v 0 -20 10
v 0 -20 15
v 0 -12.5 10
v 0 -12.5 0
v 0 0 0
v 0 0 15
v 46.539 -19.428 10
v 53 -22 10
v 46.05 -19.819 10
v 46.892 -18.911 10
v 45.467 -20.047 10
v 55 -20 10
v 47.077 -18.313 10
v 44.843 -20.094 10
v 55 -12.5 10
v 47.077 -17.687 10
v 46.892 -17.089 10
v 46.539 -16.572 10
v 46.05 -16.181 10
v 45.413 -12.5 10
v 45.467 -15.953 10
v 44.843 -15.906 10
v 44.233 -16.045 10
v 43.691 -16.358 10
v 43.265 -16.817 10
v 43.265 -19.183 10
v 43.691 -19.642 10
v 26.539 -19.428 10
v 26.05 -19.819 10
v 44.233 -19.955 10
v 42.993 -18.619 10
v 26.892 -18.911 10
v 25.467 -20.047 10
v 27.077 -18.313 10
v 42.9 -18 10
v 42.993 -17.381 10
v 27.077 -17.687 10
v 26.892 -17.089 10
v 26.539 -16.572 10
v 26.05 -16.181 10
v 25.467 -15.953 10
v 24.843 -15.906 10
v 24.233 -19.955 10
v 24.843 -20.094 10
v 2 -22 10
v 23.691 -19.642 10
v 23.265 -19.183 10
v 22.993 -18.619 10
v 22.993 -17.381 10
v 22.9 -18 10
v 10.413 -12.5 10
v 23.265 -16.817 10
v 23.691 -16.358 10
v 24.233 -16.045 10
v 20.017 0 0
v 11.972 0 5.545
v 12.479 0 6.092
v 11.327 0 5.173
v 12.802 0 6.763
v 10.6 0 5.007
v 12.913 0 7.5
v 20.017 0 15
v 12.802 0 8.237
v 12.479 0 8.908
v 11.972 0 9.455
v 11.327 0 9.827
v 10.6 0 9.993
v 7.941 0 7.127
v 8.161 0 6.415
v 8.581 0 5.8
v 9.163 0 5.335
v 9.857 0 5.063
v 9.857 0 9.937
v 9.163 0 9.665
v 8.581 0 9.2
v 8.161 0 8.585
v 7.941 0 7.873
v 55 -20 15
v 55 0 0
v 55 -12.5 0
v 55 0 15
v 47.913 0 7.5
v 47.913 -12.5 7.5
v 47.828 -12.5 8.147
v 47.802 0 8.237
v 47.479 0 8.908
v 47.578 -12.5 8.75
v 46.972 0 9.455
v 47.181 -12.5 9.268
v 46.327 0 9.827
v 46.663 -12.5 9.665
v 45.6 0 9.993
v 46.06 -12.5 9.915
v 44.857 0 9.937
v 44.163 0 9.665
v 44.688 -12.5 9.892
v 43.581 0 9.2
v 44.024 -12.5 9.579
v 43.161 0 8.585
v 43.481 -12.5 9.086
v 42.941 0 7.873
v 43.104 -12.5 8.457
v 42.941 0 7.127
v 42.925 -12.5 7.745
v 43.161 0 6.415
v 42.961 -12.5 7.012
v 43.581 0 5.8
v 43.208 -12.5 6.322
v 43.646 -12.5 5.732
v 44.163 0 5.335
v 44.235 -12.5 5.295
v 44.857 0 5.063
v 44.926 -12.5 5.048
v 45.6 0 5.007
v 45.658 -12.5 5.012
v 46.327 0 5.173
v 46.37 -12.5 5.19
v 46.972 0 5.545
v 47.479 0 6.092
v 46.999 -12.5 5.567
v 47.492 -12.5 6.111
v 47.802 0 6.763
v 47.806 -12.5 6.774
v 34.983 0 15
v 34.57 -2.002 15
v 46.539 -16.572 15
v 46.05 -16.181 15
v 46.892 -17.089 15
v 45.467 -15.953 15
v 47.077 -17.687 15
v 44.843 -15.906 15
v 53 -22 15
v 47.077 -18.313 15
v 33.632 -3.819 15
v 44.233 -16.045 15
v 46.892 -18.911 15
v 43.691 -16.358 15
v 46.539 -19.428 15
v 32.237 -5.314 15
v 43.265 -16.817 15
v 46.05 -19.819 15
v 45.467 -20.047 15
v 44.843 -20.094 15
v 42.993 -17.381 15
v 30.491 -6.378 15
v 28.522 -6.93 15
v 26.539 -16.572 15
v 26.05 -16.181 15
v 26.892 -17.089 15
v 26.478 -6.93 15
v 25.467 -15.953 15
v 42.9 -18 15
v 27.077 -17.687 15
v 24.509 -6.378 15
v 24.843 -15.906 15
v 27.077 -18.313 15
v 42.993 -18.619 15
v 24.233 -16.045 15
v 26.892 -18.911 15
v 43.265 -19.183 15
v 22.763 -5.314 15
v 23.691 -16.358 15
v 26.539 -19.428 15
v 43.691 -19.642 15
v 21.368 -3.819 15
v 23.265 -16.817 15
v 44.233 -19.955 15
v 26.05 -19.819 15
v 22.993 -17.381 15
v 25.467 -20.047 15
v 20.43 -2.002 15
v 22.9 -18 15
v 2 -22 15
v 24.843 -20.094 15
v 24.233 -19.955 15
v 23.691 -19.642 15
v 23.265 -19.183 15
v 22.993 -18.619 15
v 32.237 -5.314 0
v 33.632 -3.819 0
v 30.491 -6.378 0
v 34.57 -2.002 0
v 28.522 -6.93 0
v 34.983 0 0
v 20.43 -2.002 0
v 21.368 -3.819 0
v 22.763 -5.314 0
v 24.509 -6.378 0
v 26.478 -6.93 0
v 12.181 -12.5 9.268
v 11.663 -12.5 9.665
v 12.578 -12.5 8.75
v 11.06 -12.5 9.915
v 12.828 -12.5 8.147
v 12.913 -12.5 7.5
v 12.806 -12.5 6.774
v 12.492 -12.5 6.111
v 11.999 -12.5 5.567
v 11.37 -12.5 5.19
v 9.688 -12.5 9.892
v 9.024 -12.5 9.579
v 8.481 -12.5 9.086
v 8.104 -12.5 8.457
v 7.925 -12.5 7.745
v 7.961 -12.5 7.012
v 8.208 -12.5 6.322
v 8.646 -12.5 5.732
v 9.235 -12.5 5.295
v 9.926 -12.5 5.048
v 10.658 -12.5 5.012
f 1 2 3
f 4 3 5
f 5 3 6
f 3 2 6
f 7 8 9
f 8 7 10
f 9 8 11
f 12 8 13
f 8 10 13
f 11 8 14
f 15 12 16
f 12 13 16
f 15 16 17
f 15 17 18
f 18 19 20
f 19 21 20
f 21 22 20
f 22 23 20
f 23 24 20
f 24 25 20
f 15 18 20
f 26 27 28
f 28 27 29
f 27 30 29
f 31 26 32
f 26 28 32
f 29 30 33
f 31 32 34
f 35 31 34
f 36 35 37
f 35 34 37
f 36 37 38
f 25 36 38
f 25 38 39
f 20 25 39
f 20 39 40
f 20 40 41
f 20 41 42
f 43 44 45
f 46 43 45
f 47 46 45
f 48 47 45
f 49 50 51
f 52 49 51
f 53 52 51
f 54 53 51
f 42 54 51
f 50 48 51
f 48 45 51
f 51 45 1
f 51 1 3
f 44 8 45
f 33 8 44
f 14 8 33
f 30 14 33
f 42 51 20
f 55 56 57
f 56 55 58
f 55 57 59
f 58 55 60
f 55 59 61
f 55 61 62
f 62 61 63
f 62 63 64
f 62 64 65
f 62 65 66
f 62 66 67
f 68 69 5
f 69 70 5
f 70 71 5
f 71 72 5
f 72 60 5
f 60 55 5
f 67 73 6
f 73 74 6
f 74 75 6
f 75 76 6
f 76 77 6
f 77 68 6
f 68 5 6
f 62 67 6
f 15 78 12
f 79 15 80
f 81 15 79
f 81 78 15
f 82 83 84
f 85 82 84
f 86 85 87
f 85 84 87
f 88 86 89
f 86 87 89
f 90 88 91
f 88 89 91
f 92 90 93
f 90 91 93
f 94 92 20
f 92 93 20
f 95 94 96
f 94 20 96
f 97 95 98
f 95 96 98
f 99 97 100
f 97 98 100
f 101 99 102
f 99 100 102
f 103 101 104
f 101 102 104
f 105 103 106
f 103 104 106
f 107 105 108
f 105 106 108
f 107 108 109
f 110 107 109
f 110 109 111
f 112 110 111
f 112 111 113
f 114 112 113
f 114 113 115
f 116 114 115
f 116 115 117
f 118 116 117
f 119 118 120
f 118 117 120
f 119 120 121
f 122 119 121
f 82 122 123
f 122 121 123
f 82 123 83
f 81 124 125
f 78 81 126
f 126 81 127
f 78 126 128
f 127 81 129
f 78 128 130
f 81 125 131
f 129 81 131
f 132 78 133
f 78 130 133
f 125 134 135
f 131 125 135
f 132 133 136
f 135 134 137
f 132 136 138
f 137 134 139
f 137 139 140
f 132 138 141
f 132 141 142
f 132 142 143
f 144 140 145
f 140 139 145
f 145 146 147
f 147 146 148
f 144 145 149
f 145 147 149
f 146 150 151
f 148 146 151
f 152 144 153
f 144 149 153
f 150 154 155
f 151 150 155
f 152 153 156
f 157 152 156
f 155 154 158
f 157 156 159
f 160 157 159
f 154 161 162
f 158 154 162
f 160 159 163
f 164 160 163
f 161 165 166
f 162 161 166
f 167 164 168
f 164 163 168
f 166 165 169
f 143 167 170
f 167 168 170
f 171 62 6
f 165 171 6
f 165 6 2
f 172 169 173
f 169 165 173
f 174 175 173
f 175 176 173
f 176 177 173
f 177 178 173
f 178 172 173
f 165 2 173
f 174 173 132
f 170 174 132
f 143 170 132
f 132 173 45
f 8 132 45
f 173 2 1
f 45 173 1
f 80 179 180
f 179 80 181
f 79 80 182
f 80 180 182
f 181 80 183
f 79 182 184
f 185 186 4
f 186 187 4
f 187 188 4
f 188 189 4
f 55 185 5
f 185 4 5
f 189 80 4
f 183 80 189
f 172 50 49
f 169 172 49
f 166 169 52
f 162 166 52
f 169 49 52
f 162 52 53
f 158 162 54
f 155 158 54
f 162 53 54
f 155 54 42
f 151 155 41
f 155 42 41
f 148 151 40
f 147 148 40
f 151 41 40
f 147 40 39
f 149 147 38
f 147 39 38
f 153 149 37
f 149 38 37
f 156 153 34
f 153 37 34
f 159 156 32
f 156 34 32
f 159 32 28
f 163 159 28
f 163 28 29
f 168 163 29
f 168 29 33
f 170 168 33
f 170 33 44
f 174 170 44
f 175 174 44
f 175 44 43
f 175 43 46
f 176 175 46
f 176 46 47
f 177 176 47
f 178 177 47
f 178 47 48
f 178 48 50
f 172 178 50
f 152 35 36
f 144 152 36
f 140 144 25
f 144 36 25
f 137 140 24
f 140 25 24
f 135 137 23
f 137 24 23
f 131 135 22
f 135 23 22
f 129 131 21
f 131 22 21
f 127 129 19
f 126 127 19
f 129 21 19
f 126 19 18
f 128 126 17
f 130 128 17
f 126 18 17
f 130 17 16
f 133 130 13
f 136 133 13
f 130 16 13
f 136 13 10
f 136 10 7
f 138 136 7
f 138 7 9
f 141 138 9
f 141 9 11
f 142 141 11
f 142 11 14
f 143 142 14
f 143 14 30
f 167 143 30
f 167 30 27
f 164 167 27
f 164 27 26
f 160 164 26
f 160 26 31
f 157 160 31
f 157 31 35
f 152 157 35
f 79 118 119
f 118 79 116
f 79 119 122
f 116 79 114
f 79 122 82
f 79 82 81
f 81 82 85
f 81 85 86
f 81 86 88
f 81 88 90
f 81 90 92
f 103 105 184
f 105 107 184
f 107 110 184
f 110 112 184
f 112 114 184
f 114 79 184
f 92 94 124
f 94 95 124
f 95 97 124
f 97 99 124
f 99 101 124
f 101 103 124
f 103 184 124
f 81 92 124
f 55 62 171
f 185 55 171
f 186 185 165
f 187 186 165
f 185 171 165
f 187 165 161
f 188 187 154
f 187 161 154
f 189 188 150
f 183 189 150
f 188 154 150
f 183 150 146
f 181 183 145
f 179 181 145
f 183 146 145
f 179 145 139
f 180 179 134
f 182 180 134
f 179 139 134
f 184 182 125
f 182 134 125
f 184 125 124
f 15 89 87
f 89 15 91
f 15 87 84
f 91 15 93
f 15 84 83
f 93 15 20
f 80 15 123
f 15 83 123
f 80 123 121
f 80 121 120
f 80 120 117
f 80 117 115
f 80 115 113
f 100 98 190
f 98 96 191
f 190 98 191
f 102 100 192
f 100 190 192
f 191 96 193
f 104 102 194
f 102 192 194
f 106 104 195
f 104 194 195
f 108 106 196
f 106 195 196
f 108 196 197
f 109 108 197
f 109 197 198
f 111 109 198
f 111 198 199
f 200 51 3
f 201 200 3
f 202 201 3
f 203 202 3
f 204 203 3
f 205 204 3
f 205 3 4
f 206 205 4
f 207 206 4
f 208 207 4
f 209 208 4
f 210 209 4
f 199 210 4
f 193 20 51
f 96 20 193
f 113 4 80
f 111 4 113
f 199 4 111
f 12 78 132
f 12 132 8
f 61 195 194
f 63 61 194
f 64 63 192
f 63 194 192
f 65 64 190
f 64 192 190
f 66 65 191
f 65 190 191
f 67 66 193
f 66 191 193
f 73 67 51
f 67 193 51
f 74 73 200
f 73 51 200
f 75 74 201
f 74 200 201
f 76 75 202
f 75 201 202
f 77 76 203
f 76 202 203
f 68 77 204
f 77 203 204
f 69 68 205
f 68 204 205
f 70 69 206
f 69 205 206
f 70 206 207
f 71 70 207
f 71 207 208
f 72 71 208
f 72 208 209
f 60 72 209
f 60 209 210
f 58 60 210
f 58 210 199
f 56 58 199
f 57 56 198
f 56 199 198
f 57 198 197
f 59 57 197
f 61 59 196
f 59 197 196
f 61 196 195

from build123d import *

# Parameters (mm, degrees)
F1_DEPTH = 55
F3_DEPTH = 60
F5_D     = 4.2
F7_D     = 5
F8_SIZE2 = 2
F8_SIZE  = 2


with BuildPart() as f1:
    # F0 (on Right) → F1 (new body)
    with BuildSketch(Plane.YZ):
        Polygon((-12.5, 0), (0, 0), (0, 15), (-22, 15), (-22, 10), (-12.5, 10), align=None)
    extrude(amount=F1_DEPTH)

    # F2 (on face) → F3 (cut)
    with BuildSketch(Plane.XY.offset(15)):
        with BuildLine():
            Line((34.9833147735, 0), (20.0166852265, 0))
            ThreePointArc((20.0166852265, 0), (27.5, -7), (34.9833147735, 0))
        make_face()
        with BuildLine():
            ThreePointArc((34.9833147735, 0), (34.9958275328, 0.2498608403), (35, 0.5))
            ThreePointArc((35, 0.5), (27.2498608403, 7.9958275328), (20.0166852265, 0))
            Line((20.0166852265, 0), (34.9833147735, 0))
        make_face()
    extrude(amount=-F3_DEPTH, mode=Mode.SUBTRACT)

    # F5 (through all)
    with Locations(Plane.XY.offset(15)):
        with Locations((25, -18), (45, -18)):
            Hole(F5_D / 2)

    # F7 (through all)
    with Locations(Plane(origin=(0, 0, 0), x_dir=(-1, 0, 0), z_dir=(0, 1, 0))):
        with Locations((-10.413300395, 7.5), (-45.413300395, 7.5)):
            Hole(F7_D / 2)

    # F8
    f8_edges = [f1.edges().sort_by_distance(p)[0] for p in [
        (0, -22, 12.5),
        (55, -22, 12.5),
    ]]
    chamfer(f8_edges, length=F8_SIZE, length2=F8_SIZE2)


solid = f1.part
